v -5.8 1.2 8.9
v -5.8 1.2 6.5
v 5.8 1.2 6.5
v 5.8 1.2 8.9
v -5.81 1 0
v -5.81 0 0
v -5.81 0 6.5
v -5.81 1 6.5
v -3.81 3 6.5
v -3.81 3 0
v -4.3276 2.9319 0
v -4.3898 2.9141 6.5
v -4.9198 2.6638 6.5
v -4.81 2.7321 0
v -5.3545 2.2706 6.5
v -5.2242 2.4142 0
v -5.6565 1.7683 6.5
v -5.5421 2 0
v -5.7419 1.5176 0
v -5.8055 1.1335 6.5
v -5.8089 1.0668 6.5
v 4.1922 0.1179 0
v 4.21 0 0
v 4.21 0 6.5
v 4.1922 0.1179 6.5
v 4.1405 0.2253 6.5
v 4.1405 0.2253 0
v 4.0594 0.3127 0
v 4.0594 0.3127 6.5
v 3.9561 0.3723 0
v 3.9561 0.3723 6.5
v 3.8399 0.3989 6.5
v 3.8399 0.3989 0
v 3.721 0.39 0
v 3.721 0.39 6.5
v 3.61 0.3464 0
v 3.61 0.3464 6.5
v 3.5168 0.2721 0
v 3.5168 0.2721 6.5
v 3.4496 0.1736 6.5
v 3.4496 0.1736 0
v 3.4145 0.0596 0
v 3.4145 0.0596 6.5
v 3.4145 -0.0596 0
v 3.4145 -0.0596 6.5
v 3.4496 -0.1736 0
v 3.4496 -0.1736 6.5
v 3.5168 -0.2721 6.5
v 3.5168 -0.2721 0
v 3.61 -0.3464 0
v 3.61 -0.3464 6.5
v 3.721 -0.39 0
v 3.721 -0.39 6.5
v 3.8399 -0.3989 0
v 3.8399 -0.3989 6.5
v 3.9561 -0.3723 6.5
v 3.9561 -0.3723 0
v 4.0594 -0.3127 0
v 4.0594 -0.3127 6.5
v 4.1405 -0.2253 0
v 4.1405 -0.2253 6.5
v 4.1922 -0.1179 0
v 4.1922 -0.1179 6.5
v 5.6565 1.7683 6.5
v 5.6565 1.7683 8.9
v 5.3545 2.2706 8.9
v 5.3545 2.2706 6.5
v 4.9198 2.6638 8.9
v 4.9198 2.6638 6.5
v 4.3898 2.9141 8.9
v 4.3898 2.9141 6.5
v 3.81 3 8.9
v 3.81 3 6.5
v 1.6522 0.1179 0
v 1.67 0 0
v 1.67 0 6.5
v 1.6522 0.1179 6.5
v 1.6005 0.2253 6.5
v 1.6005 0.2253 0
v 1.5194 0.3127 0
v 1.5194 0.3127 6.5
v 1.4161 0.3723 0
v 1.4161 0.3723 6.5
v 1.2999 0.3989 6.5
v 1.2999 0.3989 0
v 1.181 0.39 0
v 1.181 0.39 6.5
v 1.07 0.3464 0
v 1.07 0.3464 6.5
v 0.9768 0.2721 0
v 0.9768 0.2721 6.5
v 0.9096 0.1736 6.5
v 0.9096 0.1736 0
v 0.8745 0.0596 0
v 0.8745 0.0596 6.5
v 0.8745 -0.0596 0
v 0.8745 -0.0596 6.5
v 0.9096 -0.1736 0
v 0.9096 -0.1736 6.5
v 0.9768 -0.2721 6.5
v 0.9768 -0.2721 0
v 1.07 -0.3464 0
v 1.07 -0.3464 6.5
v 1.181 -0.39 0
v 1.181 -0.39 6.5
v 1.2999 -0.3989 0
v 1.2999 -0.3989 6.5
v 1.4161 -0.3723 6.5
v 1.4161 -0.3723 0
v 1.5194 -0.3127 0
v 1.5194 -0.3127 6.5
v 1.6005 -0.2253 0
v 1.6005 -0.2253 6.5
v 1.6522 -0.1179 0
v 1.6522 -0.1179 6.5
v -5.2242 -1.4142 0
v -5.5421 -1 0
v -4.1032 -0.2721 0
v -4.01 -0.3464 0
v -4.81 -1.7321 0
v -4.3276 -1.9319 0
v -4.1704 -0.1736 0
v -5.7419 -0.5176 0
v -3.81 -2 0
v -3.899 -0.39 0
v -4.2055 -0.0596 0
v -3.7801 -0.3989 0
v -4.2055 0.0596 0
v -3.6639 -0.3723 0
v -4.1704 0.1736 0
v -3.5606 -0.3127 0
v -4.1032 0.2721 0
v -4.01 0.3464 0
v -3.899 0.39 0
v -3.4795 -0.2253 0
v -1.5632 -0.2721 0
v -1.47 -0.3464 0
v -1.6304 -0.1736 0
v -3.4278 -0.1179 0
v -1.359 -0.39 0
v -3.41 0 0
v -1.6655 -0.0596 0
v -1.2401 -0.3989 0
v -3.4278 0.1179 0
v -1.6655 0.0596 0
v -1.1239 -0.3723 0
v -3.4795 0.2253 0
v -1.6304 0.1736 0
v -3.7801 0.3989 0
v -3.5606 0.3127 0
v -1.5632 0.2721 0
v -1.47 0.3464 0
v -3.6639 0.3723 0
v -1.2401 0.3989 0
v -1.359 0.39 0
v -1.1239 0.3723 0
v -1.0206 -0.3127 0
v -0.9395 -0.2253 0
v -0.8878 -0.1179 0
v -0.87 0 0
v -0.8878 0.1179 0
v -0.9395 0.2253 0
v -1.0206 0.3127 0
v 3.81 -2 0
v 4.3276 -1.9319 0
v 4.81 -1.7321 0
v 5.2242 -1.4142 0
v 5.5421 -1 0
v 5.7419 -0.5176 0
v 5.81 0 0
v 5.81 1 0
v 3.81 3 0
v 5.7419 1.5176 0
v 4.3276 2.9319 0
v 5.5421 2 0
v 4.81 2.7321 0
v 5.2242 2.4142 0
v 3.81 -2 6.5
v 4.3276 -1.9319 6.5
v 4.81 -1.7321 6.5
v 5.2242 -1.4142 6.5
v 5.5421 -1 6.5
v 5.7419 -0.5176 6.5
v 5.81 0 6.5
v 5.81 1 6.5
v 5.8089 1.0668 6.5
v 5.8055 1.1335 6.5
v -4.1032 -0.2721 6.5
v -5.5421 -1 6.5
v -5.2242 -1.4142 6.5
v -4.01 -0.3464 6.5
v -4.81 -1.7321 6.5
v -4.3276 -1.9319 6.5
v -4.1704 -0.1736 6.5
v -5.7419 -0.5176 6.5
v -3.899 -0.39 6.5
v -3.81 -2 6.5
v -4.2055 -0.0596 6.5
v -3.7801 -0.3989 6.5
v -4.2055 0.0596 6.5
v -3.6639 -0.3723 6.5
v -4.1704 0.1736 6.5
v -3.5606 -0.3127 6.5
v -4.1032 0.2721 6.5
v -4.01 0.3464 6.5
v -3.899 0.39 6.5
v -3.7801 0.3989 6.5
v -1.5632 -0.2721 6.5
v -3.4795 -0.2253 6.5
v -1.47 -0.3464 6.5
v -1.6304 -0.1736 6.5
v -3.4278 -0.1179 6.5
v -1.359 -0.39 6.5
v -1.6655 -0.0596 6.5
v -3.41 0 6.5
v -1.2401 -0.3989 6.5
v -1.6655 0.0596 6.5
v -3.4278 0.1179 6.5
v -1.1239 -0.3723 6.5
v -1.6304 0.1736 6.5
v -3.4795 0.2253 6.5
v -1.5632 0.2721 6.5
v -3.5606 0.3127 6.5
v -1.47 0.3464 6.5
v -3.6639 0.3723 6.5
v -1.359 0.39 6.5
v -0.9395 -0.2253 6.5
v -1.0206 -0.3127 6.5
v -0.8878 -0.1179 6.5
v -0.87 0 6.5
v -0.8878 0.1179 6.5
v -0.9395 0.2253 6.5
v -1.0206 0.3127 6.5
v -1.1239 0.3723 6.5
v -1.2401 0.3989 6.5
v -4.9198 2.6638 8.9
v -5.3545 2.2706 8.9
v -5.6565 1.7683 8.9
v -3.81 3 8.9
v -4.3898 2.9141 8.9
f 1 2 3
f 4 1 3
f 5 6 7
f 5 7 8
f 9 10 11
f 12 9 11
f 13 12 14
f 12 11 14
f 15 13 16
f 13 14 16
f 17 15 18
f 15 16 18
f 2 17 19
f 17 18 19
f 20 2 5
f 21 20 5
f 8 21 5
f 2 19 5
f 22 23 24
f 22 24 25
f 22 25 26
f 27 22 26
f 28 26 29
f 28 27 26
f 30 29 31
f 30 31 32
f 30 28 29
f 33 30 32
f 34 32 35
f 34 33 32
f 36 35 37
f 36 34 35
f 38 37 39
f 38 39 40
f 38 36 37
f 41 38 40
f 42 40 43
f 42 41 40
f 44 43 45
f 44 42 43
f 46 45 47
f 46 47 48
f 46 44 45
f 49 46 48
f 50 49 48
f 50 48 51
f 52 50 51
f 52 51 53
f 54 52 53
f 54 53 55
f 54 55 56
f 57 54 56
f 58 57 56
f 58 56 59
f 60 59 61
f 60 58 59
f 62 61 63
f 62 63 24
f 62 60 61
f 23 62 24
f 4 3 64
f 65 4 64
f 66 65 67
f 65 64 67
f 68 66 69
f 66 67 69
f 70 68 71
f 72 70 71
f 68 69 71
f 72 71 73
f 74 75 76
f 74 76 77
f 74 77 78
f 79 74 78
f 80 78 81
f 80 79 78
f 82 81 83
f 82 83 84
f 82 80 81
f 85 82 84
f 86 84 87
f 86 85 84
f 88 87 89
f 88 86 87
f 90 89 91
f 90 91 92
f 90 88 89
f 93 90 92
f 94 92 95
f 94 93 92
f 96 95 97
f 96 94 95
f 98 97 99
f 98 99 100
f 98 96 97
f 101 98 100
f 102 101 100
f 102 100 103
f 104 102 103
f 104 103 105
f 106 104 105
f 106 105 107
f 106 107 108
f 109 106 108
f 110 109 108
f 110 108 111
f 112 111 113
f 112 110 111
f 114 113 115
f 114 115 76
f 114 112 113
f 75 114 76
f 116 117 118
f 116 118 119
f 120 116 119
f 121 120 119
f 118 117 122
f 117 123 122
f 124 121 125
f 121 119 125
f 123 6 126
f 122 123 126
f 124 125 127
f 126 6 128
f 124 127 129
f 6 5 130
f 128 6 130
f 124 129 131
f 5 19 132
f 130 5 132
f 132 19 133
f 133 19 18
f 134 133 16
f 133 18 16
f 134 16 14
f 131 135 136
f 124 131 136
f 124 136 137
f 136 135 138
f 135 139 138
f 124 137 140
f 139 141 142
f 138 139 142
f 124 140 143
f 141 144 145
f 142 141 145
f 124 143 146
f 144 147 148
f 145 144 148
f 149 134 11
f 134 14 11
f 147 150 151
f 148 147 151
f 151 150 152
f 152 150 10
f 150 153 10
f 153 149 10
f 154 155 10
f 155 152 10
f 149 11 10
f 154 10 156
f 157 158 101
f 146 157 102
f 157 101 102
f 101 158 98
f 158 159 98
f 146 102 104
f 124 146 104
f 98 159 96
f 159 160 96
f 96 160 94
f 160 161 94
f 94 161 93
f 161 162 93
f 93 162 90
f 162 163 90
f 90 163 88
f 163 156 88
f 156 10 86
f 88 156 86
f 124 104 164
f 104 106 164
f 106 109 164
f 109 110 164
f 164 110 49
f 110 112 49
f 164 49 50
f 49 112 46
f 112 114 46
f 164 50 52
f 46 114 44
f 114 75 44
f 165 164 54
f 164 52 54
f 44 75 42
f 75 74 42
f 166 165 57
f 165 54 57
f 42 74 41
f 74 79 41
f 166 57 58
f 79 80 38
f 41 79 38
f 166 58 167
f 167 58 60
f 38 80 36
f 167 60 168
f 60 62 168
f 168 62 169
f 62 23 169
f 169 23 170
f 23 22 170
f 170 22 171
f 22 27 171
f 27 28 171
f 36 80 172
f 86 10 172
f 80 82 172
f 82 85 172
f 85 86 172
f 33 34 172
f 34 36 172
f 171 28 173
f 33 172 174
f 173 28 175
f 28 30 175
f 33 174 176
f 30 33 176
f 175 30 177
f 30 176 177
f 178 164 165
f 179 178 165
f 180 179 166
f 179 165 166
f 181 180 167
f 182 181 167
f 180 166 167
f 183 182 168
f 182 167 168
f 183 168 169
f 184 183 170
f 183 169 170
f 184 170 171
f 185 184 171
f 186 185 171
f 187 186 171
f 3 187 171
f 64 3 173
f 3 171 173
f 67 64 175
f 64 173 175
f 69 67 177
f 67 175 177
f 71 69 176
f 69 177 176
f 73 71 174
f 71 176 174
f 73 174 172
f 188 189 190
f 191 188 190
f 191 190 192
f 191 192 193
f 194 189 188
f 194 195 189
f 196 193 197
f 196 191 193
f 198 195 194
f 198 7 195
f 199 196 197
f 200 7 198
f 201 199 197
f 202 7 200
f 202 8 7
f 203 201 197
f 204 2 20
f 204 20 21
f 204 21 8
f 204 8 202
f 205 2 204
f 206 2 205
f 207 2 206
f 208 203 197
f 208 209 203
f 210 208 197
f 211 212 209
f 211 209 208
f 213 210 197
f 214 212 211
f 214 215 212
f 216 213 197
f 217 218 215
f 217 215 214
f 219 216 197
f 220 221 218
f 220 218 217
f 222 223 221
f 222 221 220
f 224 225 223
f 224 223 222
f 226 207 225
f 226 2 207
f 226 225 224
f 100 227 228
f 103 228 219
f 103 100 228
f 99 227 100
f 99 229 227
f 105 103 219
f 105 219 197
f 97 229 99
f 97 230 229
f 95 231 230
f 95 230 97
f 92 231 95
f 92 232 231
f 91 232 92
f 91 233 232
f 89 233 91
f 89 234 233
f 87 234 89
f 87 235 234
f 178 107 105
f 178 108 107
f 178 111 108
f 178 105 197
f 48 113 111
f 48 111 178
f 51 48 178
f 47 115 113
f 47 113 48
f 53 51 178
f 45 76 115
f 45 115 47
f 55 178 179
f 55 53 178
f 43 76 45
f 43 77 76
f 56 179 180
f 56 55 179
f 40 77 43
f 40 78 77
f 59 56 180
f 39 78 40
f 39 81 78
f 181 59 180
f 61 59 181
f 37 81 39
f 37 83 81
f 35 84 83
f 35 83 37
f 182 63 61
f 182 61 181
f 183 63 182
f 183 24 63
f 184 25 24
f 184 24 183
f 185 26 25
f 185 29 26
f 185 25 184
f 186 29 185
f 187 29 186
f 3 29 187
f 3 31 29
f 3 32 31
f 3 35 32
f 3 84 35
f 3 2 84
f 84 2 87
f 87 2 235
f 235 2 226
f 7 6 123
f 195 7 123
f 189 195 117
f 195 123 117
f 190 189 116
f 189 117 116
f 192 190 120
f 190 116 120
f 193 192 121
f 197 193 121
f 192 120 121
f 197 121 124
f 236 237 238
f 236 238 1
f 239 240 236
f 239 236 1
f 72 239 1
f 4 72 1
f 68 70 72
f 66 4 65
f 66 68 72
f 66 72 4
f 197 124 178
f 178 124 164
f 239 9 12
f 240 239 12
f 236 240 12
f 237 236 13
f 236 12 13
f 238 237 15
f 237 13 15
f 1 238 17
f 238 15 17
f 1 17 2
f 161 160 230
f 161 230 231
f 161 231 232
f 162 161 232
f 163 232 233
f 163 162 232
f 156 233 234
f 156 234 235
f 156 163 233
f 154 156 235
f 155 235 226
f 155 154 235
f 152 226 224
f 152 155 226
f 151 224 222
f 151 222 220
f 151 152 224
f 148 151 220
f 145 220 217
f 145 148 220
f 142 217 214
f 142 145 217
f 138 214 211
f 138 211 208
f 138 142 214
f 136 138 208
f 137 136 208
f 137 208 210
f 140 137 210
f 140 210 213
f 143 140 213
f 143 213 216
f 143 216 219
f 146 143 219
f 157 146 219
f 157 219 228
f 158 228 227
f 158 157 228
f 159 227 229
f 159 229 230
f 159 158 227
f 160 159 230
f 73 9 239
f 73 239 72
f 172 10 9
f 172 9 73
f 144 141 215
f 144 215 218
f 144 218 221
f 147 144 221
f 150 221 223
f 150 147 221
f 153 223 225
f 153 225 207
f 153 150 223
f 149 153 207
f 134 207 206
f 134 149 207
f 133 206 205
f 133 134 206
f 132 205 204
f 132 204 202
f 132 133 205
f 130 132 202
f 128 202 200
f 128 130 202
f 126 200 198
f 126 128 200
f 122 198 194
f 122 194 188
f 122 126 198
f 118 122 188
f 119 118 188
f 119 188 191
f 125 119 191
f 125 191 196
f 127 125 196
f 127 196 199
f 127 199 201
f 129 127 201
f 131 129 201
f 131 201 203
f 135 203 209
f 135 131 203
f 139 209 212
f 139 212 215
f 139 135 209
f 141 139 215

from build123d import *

# Parameters (mm, degrees)
SKETCH_R     = 0.4
PAD_DEPTH    = 6.5
PAD001_DEPTH = 2.4


with BuildPart() as part:
    # Sketch → Pad (new body)
    with BuildSketch(Plane.XY):
        with BuildLine():
            Line((-3.81, -2), (3.81, -2))
            ThreePointArc((3.81, -2), (5.224214, -1.414214), (5.81, 0))
            Line((5.81, 0), (5.81, 1))
            ThreePointArc((5.81, 1), (5.224214, 2.414214), (3.81, 3))
            Line((3.81, 3), (-3.81, 3))
            ThreePointArc((-3.81, 3), (-5.224214, 2.414214), (-5.81, 1))
            Line((-5.81, 0), (-5.81, 1))
            ThreePointArc((-5.81, 0), (-5.224214, -1.414214), (-3.81, -2))
        make_face()
        with Locations((-3.81, 0)):
            Circle(SKETCH_R, mode=Mode.SUBTRACT)
        with Locations((-1.27, 0)):
            Circle(SKETCH_R, mode=Mode.SUBTRACT)
        with Locations((1.27, 0)):
            Circle(SKETCH_R, mode=Mode.SUBTRACT)
        with Locations((3.81, 0)):
            Circle(SKETCH_R, mode=Mode.SUBTRACT)
    extrude(amount=PAD_DEPTH)

    # Sketch001 → Pad001 (join)
    with BuildSketch(Plane.XY.offset(6.5)):
        with BuildLine():
            ThreePointArc((-3.81, 3), (-5.151641, 2.48324), (-5.799975, 1.2))
            Line((-5.799975, 1.2), (5.799975, 1.2))
            ThreePointArc((5.799975, 1.2), (5.151641, 2.48324), (3.81, 3))
            Line((-3.81, 3), (3.81, 3))
        make_face()
    extrude(amount=PAD001_DEPTH)


solid = part.part
